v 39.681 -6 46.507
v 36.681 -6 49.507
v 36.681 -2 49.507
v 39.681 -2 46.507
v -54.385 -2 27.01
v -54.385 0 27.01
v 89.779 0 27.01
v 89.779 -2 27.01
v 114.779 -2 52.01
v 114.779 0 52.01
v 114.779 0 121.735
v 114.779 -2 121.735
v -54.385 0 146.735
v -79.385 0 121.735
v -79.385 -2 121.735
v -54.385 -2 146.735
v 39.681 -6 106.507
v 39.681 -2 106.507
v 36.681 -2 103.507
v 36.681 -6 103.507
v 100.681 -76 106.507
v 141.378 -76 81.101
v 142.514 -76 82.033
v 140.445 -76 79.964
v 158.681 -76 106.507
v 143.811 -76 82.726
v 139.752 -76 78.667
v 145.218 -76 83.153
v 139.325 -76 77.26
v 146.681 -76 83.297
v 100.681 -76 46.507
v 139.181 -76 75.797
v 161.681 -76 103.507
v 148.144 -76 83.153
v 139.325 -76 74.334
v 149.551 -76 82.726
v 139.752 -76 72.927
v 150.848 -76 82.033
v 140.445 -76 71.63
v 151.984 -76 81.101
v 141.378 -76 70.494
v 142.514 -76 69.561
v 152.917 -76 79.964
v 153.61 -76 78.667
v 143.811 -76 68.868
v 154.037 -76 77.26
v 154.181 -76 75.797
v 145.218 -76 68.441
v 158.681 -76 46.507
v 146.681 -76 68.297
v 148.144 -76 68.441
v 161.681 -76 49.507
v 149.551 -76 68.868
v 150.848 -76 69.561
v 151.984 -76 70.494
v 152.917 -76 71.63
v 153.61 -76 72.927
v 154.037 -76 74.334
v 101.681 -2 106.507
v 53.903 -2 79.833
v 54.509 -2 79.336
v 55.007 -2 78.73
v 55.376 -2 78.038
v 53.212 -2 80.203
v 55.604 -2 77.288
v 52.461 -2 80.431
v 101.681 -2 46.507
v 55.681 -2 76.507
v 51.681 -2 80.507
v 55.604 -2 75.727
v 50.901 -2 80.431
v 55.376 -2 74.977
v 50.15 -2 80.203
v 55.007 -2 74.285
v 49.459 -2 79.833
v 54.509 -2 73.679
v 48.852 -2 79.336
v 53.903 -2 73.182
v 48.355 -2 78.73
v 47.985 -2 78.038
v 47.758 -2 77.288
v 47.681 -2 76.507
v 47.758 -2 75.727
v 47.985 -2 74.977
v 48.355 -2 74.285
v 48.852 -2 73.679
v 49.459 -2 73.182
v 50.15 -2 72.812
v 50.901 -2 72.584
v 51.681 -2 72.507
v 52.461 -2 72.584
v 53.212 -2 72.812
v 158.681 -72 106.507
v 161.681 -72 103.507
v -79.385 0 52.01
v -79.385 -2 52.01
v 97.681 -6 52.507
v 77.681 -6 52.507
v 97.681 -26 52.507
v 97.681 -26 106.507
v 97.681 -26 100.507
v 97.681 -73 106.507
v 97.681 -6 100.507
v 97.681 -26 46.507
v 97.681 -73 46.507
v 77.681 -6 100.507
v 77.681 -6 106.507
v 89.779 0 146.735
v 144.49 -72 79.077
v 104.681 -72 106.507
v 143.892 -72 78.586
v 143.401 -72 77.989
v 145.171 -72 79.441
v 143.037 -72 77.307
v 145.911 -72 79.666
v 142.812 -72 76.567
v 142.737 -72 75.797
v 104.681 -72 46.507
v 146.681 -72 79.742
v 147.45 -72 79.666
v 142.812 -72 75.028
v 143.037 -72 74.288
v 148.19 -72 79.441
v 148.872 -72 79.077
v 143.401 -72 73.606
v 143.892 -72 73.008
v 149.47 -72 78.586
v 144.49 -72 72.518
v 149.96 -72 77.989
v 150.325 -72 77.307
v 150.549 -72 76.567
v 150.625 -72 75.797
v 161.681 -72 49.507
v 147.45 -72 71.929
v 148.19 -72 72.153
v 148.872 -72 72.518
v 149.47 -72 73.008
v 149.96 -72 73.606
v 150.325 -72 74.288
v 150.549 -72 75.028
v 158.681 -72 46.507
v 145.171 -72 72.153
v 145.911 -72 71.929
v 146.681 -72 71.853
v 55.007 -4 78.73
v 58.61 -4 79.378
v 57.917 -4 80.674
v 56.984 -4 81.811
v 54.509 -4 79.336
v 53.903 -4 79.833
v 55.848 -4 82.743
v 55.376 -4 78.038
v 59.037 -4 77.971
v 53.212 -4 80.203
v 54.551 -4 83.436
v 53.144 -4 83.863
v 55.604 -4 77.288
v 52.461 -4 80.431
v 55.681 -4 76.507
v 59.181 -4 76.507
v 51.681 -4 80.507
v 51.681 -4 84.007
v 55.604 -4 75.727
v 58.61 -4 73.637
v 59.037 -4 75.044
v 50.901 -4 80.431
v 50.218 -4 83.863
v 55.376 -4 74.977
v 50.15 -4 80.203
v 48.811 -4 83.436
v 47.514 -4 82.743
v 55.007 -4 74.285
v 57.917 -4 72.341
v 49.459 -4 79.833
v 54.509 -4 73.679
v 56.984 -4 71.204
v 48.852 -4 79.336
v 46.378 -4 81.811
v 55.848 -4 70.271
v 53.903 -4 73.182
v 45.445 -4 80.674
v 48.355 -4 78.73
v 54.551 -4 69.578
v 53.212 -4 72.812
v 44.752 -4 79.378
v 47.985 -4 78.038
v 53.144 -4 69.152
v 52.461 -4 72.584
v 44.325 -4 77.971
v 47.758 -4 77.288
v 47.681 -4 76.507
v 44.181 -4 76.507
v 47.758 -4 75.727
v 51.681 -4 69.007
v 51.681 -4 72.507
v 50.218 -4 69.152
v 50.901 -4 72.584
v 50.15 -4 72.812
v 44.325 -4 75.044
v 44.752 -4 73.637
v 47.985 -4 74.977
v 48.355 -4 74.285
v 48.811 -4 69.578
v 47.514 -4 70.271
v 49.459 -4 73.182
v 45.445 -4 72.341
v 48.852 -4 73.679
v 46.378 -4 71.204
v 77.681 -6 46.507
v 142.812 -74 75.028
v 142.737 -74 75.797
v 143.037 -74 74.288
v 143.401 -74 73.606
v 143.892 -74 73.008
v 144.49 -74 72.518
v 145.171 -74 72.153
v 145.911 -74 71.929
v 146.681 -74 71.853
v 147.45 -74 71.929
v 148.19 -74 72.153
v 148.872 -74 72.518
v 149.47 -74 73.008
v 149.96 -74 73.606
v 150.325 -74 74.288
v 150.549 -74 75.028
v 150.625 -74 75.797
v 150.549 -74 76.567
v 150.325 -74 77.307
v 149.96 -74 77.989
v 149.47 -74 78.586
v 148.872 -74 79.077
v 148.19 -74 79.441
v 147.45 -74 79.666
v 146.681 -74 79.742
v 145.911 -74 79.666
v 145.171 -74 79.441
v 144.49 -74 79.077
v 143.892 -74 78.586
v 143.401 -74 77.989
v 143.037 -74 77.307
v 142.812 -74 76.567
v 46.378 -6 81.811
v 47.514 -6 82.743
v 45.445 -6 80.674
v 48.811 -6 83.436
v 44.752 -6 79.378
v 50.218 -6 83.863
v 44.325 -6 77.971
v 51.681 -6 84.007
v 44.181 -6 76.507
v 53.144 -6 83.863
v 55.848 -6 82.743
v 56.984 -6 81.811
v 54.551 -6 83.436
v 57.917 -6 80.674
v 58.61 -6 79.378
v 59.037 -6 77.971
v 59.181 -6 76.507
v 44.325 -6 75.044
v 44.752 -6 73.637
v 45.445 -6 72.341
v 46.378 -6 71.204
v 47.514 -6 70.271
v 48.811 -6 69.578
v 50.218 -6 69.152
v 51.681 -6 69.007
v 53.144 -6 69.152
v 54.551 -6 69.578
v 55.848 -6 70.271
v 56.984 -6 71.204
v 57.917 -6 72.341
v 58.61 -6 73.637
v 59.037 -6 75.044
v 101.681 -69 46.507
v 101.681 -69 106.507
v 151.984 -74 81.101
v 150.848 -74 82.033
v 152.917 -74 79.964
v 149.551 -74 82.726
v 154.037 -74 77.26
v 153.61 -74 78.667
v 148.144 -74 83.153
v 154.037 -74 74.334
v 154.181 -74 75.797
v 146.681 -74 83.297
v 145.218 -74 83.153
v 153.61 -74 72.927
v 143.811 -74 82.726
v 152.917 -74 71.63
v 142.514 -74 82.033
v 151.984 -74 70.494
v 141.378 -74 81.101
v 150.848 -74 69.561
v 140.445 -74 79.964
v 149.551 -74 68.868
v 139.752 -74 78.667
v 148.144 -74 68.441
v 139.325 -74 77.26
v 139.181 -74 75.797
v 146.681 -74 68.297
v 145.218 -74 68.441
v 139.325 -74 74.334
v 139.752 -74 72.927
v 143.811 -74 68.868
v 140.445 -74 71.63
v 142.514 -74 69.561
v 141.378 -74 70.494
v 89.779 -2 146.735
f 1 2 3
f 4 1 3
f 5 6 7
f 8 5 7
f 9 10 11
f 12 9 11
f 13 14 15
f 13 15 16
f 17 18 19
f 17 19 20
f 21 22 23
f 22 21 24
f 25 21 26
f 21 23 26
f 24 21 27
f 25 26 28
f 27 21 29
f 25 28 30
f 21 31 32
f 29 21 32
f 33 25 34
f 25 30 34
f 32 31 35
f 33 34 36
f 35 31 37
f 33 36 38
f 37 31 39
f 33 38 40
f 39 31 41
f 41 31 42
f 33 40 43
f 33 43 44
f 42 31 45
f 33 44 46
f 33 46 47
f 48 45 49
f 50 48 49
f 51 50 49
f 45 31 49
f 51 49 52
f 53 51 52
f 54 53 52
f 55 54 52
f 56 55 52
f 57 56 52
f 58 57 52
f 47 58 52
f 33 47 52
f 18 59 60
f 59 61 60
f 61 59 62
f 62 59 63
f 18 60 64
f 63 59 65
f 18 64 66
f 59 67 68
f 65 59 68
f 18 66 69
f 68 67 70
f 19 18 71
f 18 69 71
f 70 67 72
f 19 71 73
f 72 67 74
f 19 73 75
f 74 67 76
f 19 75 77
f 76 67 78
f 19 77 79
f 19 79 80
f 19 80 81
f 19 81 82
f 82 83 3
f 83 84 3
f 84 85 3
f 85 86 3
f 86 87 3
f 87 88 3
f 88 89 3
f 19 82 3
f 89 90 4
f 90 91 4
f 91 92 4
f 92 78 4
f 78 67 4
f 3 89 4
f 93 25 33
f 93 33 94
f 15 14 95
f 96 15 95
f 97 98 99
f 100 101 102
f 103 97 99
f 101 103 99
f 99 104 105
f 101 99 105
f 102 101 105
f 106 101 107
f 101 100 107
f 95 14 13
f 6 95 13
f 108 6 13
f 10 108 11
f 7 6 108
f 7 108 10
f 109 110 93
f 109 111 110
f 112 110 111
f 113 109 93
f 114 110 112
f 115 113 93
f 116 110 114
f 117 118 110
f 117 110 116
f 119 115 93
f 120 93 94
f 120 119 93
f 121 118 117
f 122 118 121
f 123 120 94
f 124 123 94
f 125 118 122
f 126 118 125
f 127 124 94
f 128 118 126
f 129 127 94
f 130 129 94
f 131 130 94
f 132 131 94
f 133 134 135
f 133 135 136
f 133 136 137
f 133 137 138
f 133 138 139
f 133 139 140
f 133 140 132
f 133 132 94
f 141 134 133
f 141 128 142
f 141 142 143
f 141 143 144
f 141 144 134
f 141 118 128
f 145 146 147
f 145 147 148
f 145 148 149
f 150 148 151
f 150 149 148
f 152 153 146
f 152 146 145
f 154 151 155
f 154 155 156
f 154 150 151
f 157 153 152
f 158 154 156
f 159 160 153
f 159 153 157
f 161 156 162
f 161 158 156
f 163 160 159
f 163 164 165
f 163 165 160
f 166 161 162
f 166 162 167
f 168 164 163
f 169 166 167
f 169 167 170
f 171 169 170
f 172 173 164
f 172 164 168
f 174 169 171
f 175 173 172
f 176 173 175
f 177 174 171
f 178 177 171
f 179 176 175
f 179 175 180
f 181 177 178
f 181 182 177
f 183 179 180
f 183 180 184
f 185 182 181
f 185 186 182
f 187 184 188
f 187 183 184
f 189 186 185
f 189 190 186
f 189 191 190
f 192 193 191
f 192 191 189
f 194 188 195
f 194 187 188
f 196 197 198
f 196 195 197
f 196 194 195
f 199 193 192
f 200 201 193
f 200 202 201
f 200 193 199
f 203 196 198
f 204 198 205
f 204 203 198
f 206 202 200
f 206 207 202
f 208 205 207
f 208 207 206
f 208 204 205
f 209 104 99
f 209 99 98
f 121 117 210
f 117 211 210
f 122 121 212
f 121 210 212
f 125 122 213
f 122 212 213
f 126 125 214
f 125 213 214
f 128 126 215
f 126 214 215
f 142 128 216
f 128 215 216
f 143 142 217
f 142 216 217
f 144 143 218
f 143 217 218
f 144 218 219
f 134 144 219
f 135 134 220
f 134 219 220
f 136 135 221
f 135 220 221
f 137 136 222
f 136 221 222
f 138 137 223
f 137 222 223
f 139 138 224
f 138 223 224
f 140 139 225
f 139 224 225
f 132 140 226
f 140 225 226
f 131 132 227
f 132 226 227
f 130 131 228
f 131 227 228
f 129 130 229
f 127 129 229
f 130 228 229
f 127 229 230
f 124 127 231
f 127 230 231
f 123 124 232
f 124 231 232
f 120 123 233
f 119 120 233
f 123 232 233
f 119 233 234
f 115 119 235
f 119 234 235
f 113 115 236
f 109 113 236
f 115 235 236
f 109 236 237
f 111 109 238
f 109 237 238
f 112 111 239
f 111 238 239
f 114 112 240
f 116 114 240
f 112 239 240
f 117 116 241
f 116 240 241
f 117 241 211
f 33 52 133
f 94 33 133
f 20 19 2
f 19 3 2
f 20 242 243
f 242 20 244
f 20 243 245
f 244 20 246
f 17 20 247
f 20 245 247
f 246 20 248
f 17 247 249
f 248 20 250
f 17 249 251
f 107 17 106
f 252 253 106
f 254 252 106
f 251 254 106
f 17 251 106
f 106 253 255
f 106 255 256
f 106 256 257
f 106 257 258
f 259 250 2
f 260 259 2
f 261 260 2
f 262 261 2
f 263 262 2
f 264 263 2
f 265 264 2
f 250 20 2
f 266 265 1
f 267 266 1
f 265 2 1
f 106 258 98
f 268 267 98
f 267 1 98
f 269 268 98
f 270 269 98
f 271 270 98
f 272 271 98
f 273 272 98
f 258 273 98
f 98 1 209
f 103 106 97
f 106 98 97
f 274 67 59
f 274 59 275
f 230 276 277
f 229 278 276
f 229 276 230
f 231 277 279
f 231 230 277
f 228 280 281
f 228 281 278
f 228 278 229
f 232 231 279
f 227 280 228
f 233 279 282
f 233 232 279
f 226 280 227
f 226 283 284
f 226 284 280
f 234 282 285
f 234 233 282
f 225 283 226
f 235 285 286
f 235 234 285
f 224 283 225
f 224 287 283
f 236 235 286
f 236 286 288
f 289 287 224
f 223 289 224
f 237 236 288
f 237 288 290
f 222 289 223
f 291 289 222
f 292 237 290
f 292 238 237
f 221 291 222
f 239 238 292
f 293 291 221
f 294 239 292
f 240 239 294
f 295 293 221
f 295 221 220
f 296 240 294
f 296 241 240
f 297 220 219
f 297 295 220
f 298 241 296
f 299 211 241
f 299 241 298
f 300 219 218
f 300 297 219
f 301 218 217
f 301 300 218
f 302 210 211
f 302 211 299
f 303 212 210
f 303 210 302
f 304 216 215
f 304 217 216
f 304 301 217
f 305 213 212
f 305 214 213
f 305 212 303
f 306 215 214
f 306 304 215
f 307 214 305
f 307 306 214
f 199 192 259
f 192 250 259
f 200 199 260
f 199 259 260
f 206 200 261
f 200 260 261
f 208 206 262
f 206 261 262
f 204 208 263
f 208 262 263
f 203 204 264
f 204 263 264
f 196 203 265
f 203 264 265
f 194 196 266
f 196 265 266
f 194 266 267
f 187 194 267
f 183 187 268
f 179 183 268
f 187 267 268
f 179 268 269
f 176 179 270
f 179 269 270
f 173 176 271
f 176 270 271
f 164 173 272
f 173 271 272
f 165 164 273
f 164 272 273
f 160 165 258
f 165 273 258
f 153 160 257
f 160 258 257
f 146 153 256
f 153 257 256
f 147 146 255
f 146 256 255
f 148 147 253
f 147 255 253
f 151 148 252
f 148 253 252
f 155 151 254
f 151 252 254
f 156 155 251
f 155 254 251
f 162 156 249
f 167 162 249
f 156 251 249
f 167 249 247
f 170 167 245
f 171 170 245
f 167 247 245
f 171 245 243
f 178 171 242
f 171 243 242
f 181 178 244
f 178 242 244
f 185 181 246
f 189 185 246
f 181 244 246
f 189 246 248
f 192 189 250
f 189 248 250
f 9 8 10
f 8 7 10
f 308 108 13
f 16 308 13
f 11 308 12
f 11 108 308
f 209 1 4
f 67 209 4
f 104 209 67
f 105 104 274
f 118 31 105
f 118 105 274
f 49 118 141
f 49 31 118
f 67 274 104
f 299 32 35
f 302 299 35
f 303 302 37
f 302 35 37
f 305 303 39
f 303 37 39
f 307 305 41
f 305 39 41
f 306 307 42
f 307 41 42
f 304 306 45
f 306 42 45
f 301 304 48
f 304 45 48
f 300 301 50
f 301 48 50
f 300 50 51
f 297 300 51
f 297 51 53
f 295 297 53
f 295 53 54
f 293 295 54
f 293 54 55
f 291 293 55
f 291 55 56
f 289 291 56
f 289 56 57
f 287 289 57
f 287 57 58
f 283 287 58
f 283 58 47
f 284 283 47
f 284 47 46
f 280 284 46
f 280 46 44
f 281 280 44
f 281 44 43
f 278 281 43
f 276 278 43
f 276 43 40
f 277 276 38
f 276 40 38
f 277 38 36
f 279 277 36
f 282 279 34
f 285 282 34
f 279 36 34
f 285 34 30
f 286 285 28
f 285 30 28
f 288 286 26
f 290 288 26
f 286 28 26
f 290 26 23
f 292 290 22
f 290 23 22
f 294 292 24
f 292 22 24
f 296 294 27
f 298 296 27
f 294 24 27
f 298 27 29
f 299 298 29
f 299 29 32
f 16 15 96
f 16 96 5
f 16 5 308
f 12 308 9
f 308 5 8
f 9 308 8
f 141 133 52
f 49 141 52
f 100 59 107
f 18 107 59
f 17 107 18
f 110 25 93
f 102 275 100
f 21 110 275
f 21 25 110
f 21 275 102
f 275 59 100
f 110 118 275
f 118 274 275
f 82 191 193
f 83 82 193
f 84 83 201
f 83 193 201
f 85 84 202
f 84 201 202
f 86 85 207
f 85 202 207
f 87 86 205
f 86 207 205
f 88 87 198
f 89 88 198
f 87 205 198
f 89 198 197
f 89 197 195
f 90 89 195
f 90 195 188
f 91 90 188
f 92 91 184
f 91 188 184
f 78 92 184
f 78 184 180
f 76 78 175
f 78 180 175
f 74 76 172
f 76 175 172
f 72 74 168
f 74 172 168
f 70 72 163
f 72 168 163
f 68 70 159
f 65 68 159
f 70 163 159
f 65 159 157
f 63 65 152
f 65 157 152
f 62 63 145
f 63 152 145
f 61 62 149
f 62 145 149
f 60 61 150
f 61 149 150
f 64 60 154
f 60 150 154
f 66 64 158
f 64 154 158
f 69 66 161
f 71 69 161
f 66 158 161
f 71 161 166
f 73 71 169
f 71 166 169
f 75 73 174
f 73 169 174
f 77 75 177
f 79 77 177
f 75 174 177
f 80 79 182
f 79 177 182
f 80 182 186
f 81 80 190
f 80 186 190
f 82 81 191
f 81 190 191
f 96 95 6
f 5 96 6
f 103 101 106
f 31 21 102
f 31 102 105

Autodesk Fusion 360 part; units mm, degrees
sketch "Sketch1" plane through (0, 0, 0) normal (0, 0, 1) x (1, 0, 0)
  line L0 (0, 0) -> (-65, 0)
  line L1 (0, 0) -> (0, 70)
  line L2 (0, 70) -> (60, 70)
  line L3 (-65, 0) -> (-65, 4)
  line L4 (-65, 4) -> (-4, 4)
  line L5 (-4, 4) -> (-4, 74)
  line L6 (-4, 74) -> (60, 74)
  line L7 (60, 74) -> (60, 70)
  dimension "d1" = 65
  dimension "d2" = 70
  dimension "d3" = 60
  dimension "d4" = 4
  dimension "d5" = 4
  dimension "d6" = 64
  dimension "d7" = 4
extrude "Extrude1" add sketch "Sketch1" against normal blind 60 makes body 1
sketch "Sketch2" plane through (0, 74, 0) normal (0, 1, 0) x (-1, 0, 0)
  line L0 (4, 0) -> (-60, 0)
  line L1 (-60, 0) -> (-60, -60)
  line L2 (-60, -60) -> (4, -60)
  line L3 (4, -60) -> (4, 0)
  line L4 (-45, -68.4051) -> (-45, 9.8256) construction
  line L5 (-35, -30) -> (-85, -30) construction
  circle A0 centre (-45, -29.2898) radius 7.5
  dimension "d10" = 15
  dimension "d11" = 15
extrude "Extrude2" cut sketch "Sketch2" against normal blind 2 contours A0 bodies 1
sketch "Sketch3" plane through (0, 74, 0) normal (0, 1, 0) x (-1, 0, 0)
  circle A0 centre (-45, -29.2898) radius 7.5
  line L0 (4, 0) -> (-60, 0)
  line L1 (-60, 0) -> (-60, -60)
  line L2 (-60, -60) -> (4, -60)
  line L3 (4, -60) -> (4, 0)
  circle A1 centre (-45, -29.2898) radius 3.9443
extrude "Extrude3" cut sketch "Sketch3" against normal blind 4 contours A1 bodies 1
sketch "Sketch4" plane through (0, 4, 0) normal (0, 1, 0) x (-1, 0, 0)
  line L0 (65, 0) -> (4, 0)
  line L1 (4, 0) -> (4, -60)
  line L2 (4, -60) -> (65, -60)
  line L3 (65, -60) -> (65, 0)
  line L4 (50, -66.7839) -> (50, -0.7237) construction
  line L5 (87.1984, -30) -> (42.8016, -30) construction
  circle A0 centre (50, -30) radius 7.5
  circle A1 centre (50, -30) radius 4
  dimension "d16" = 15
  dimension "d17" = 15
extrude "Extrude4" cut sketch "Sketch4" against normal blind 2 contours A0 bodies 1
extrude "Extrude5" cut 1 faces at (-49.7543, 4, -29.3803) along direction (0, -1, 0) blind 4 on bodies 1 bodies 1
chamfer "Chamfer1" distance 3 angle 45 1 edges at (-4, 74, -30) on bodies 1
chamfer "Chamfer2" distance 3 angle 45 1 edges at (0, 70, -30) on bodies 1
chamfer "Chamfer3" distance 3 angle 45 1 edges at (60, 72, 0) on bodies 1
chamfer "Chamfer4" distance 3 angle 45 3 edges at (60, 72, -60) (-65, 2, -60) (-65, 2, 0) on bodies 1
sketch "Sketch5" plane through (0, 0, 0) normal (0, 0, 1) x (1, 0, 0)
  line L0 (-62, 4) -> (-62, 0)
  line L1 (-62, 0) -> (0, 0)
  line L2 (0, 0) -> (0, 67)
  line L3 (0, 67) -> (3, 70)
  line L4 (3, 70) -> (57, 70)
  line L5 (57, 70) -> (57, 74)
  line L6 (57, 74) -> (-1, 74)
  line L7 (-1, 74) -> (-4, 71)
  line L8 (-4, 71) -> (-4, 4)
  line L9 (-4, 4) -> (-62, 4)
  line L10 (-4, 24) -> (-24, 4)
  dimension "d26" = 20
  dimension "d27" = 20
extrude "Extrude6" add sketch "Sketch5" against normal blind 6 contours L8 L9 L10 bodies 1
sketch "Sketch6" plane through (0, 0, -60) normal (0, 0, -1) x (-1, 0, 0)
  line L0 (62, 0) -> (62, 4)
  line L1 (62, 4) -> (4, 4)
  line L2 (4, 4) -> (4, 71)
  line L3 (4, 71) -> (1, 74)
  line L4 (1, 74) -> (-57, 74)
  line L5 (-57, 74) -> (-57, 70)
  line L6 (-57, 70) -> (-3, 70)
  line L7 (-3, 70) -> (0, 67)
  line L8 (0, 67) -> (0, 0)
  line L9 (0, 0) -> (62, 0)
  line L10 (4, 24) -> (24, 4)
  dimension "d30" = 20
  dimension "d31" = 20
extrude "Extrude7" add sketch "Sketch6" against normal blind 6 contours L1 L2 L10 bodies 1
sketch "Sketch7" plane through (0, 0, 0) normal (0, 1, 0) x (1, 0, 0)
  line L0 (-54.3851, -27.0099) -> (89.7793, -27.0099)
  line L1 (114.7793, -52.0099) -> (114.7793, -121.7351)
  line L2 (89.7793, -146.7351) -> (-54.3851, -146.7351)
  line L3 (-79.3851, -121.7351) -> (-79.3851, -52.0099)
  line L4 (89.7793, -27.0099) -> (114.7793, -52.0099)
  line L5 (-79.3851, -121.7351) -> (-54.3851, -146.7351)
  line L6 (-79.3851, -52.0099) -> (-54.3851, -27.0099)
  line L7 (89.7793, -146.7351) -> (114.7793, -121.7351)
  point P0 (-79.3851, -27.0099)
  point P1 (114.7793, -27.0099)
  point P2 (114.7793, -146.7351)
  point P3 (-79.3851, -146.7351)
  dimension "d34" = 25
  dimension "d35" = 25
  dimension "d36" = 25
  dimension "d37" = 25
  dimension "d38" = 25
  dimension "d39" = 25
  dimension "d40" = 25
  dimension "d41" = 25
extrude "Extrude8" add sketch "Sketch7" against normal blind 2 separate body makes body 2
copy_body "Body->Comp1" bodies 1 removing the originals makes body 3 in component "Component"
copy_body "Body->Comp2" bodies 2 removing the originals makes body 4 in component "Component'"
component "Component" placed x (1, 0, 0) y (0, -1, 0) z (0, 0, -1) at (101.6809, -2, 46.5074)
component "Component'" placed x (1, 0, 0) y (0, 1, 0) z (0, 0, 1) at (0, 0, 0)
equation "d35 = d34"
equation "d37 = d36"
equation "d39 = d38"
equation "d41 = d40"
